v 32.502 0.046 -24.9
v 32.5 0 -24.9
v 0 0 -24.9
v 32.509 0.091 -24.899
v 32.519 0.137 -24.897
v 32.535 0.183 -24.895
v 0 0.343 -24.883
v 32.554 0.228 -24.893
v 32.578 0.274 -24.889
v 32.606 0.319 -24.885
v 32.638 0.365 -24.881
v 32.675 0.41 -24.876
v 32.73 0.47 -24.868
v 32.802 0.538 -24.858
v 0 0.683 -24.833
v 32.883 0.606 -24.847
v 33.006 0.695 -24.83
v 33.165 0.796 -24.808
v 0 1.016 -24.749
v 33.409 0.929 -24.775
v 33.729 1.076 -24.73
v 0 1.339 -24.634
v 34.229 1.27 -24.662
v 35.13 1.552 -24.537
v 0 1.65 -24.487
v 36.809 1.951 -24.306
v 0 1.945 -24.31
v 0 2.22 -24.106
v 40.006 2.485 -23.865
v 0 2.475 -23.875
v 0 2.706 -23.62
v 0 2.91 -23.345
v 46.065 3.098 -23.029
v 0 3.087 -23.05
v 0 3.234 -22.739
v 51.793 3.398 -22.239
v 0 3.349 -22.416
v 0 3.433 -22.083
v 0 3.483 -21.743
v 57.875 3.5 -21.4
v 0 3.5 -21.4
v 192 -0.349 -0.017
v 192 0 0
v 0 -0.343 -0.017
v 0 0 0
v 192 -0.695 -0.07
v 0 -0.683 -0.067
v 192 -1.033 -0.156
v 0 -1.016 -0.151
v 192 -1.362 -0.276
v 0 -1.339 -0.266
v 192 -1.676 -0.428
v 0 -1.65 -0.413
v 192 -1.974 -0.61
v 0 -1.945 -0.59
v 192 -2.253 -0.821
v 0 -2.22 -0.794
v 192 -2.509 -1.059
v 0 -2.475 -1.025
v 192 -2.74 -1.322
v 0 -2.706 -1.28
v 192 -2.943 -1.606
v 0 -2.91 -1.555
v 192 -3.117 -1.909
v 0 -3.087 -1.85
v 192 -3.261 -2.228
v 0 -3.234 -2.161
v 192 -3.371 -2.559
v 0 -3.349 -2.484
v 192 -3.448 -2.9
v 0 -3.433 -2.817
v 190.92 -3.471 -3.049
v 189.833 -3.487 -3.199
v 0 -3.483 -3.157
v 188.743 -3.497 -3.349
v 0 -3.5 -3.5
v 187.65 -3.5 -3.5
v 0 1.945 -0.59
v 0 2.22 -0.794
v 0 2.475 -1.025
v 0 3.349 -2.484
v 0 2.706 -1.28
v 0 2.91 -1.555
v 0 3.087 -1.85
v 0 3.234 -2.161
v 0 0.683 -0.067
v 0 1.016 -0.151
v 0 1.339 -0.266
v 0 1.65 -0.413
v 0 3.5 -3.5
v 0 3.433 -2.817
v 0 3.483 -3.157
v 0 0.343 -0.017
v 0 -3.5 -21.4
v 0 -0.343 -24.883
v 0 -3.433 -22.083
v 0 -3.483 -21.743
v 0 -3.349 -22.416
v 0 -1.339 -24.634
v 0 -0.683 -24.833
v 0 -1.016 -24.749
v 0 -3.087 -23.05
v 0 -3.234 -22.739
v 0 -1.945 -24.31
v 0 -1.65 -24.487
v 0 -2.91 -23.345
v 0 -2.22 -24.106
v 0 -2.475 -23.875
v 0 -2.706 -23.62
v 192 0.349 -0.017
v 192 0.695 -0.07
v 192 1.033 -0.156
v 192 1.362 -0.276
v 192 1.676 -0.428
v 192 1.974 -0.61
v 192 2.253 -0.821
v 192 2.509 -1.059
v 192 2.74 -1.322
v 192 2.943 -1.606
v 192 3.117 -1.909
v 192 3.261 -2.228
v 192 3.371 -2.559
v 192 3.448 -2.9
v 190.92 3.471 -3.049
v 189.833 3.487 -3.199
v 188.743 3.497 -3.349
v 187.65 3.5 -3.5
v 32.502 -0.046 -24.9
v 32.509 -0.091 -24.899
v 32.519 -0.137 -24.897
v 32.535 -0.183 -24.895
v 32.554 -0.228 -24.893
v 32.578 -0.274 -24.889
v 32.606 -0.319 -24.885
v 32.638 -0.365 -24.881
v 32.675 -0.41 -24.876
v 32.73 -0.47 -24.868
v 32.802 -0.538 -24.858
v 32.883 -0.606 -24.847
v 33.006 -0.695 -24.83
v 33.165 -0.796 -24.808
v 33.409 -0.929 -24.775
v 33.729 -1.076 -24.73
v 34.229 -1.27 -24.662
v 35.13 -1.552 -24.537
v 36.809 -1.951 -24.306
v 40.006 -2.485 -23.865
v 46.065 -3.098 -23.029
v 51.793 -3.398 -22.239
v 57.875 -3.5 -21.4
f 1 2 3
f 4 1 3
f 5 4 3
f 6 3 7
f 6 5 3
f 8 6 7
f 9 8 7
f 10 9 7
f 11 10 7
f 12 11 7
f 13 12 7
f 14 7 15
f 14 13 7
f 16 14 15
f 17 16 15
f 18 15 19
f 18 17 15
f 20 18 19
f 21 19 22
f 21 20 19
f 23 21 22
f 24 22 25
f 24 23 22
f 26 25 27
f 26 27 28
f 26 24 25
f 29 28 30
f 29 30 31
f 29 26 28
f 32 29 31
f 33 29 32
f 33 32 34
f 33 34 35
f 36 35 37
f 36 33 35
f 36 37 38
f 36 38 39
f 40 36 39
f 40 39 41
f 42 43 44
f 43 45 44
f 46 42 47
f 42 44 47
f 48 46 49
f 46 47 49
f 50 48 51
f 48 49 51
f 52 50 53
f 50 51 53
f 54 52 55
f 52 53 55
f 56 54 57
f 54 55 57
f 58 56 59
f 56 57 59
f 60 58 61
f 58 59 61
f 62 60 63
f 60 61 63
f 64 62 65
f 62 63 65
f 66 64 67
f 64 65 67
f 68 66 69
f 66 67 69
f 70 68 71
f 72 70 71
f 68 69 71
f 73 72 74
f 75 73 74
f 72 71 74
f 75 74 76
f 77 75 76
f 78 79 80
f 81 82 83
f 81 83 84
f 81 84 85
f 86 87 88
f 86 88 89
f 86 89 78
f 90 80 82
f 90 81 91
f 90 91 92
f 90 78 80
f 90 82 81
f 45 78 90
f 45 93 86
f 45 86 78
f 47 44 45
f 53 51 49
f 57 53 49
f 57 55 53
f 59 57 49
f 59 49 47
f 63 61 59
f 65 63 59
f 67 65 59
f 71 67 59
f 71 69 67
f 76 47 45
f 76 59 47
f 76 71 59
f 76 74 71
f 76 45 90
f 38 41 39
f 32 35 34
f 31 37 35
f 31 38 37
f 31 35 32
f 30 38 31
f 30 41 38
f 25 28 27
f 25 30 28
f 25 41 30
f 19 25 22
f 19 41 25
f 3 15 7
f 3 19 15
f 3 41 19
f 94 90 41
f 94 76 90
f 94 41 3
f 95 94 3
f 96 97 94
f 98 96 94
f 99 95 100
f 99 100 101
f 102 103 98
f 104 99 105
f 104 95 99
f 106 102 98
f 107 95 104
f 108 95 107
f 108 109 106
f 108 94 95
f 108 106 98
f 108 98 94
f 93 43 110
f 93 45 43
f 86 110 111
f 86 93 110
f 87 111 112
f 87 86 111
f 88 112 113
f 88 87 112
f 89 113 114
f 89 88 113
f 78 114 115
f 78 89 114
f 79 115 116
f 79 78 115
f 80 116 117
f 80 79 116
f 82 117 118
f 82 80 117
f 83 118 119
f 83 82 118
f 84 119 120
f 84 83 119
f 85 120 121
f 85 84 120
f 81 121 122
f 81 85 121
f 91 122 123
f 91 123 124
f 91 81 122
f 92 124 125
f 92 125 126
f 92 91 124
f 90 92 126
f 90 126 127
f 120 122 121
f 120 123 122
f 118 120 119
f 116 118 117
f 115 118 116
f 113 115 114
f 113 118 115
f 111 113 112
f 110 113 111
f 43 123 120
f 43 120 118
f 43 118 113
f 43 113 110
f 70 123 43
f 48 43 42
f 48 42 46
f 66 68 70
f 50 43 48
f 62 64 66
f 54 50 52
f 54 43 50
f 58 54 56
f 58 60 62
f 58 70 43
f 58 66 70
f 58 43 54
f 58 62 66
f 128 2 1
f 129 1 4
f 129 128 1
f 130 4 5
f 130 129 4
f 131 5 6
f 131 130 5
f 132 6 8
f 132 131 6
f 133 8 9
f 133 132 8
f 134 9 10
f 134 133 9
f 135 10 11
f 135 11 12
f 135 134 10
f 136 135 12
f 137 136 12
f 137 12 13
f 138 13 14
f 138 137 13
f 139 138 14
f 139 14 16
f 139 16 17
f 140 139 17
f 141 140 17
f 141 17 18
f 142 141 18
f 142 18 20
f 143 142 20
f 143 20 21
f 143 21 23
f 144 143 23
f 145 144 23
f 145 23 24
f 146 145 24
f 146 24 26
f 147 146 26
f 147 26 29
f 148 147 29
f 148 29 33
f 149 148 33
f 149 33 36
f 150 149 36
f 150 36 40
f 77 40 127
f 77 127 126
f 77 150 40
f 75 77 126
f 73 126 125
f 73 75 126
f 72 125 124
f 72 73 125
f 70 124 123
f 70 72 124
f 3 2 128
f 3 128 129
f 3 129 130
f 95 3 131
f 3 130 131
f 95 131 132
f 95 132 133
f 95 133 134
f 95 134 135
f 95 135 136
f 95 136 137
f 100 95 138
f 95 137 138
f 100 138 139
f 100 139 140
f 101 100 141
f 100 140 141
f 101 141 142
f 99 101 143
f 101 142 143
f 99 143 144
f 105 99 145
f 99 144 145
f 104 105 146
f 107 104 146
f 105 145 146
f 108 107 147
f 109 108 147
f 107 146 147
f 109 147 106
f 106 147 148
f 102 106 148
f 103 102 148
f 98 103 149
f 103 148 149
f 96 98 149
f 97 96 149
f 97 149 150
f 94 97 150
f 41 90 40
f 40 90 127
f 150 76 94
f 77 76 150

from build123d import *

# Parameters (mm, degrees)
F1_DEPTH = 3.5
F2_R     = 3.49999


# Not quite as in the source:
# - a fillet or chamfer is up to 0.001 mm smaller than in the source, because OpenCascade refuses the exact size


with BuildPart() as f1:
    # F0 (on Front) → F1 (new body, symmetric)
    with BuildSketch(Plane.XZ):
        Polygon((192, 0), (0, 0), (0, -24.9), (32.5, -24.9), (192, -2.9), align=None)
    extrude(amount=F1_DEPTH, both=True)

    # F2 (radius 3.5 in the source; OpenCascade refuses exactly that, so slightly less here)
    f2_edges = [f1.edges().sort_by_distance(p)[0] for p in [
        (96, -3.5, 0),
        (96, 3.5, 0),
        (16.25, -3.5, -24.9),
        (16.25, 3.5, -24.9),
    ]]
    fillet(f2_edges, radius=F2_R)


solid = f1.part
